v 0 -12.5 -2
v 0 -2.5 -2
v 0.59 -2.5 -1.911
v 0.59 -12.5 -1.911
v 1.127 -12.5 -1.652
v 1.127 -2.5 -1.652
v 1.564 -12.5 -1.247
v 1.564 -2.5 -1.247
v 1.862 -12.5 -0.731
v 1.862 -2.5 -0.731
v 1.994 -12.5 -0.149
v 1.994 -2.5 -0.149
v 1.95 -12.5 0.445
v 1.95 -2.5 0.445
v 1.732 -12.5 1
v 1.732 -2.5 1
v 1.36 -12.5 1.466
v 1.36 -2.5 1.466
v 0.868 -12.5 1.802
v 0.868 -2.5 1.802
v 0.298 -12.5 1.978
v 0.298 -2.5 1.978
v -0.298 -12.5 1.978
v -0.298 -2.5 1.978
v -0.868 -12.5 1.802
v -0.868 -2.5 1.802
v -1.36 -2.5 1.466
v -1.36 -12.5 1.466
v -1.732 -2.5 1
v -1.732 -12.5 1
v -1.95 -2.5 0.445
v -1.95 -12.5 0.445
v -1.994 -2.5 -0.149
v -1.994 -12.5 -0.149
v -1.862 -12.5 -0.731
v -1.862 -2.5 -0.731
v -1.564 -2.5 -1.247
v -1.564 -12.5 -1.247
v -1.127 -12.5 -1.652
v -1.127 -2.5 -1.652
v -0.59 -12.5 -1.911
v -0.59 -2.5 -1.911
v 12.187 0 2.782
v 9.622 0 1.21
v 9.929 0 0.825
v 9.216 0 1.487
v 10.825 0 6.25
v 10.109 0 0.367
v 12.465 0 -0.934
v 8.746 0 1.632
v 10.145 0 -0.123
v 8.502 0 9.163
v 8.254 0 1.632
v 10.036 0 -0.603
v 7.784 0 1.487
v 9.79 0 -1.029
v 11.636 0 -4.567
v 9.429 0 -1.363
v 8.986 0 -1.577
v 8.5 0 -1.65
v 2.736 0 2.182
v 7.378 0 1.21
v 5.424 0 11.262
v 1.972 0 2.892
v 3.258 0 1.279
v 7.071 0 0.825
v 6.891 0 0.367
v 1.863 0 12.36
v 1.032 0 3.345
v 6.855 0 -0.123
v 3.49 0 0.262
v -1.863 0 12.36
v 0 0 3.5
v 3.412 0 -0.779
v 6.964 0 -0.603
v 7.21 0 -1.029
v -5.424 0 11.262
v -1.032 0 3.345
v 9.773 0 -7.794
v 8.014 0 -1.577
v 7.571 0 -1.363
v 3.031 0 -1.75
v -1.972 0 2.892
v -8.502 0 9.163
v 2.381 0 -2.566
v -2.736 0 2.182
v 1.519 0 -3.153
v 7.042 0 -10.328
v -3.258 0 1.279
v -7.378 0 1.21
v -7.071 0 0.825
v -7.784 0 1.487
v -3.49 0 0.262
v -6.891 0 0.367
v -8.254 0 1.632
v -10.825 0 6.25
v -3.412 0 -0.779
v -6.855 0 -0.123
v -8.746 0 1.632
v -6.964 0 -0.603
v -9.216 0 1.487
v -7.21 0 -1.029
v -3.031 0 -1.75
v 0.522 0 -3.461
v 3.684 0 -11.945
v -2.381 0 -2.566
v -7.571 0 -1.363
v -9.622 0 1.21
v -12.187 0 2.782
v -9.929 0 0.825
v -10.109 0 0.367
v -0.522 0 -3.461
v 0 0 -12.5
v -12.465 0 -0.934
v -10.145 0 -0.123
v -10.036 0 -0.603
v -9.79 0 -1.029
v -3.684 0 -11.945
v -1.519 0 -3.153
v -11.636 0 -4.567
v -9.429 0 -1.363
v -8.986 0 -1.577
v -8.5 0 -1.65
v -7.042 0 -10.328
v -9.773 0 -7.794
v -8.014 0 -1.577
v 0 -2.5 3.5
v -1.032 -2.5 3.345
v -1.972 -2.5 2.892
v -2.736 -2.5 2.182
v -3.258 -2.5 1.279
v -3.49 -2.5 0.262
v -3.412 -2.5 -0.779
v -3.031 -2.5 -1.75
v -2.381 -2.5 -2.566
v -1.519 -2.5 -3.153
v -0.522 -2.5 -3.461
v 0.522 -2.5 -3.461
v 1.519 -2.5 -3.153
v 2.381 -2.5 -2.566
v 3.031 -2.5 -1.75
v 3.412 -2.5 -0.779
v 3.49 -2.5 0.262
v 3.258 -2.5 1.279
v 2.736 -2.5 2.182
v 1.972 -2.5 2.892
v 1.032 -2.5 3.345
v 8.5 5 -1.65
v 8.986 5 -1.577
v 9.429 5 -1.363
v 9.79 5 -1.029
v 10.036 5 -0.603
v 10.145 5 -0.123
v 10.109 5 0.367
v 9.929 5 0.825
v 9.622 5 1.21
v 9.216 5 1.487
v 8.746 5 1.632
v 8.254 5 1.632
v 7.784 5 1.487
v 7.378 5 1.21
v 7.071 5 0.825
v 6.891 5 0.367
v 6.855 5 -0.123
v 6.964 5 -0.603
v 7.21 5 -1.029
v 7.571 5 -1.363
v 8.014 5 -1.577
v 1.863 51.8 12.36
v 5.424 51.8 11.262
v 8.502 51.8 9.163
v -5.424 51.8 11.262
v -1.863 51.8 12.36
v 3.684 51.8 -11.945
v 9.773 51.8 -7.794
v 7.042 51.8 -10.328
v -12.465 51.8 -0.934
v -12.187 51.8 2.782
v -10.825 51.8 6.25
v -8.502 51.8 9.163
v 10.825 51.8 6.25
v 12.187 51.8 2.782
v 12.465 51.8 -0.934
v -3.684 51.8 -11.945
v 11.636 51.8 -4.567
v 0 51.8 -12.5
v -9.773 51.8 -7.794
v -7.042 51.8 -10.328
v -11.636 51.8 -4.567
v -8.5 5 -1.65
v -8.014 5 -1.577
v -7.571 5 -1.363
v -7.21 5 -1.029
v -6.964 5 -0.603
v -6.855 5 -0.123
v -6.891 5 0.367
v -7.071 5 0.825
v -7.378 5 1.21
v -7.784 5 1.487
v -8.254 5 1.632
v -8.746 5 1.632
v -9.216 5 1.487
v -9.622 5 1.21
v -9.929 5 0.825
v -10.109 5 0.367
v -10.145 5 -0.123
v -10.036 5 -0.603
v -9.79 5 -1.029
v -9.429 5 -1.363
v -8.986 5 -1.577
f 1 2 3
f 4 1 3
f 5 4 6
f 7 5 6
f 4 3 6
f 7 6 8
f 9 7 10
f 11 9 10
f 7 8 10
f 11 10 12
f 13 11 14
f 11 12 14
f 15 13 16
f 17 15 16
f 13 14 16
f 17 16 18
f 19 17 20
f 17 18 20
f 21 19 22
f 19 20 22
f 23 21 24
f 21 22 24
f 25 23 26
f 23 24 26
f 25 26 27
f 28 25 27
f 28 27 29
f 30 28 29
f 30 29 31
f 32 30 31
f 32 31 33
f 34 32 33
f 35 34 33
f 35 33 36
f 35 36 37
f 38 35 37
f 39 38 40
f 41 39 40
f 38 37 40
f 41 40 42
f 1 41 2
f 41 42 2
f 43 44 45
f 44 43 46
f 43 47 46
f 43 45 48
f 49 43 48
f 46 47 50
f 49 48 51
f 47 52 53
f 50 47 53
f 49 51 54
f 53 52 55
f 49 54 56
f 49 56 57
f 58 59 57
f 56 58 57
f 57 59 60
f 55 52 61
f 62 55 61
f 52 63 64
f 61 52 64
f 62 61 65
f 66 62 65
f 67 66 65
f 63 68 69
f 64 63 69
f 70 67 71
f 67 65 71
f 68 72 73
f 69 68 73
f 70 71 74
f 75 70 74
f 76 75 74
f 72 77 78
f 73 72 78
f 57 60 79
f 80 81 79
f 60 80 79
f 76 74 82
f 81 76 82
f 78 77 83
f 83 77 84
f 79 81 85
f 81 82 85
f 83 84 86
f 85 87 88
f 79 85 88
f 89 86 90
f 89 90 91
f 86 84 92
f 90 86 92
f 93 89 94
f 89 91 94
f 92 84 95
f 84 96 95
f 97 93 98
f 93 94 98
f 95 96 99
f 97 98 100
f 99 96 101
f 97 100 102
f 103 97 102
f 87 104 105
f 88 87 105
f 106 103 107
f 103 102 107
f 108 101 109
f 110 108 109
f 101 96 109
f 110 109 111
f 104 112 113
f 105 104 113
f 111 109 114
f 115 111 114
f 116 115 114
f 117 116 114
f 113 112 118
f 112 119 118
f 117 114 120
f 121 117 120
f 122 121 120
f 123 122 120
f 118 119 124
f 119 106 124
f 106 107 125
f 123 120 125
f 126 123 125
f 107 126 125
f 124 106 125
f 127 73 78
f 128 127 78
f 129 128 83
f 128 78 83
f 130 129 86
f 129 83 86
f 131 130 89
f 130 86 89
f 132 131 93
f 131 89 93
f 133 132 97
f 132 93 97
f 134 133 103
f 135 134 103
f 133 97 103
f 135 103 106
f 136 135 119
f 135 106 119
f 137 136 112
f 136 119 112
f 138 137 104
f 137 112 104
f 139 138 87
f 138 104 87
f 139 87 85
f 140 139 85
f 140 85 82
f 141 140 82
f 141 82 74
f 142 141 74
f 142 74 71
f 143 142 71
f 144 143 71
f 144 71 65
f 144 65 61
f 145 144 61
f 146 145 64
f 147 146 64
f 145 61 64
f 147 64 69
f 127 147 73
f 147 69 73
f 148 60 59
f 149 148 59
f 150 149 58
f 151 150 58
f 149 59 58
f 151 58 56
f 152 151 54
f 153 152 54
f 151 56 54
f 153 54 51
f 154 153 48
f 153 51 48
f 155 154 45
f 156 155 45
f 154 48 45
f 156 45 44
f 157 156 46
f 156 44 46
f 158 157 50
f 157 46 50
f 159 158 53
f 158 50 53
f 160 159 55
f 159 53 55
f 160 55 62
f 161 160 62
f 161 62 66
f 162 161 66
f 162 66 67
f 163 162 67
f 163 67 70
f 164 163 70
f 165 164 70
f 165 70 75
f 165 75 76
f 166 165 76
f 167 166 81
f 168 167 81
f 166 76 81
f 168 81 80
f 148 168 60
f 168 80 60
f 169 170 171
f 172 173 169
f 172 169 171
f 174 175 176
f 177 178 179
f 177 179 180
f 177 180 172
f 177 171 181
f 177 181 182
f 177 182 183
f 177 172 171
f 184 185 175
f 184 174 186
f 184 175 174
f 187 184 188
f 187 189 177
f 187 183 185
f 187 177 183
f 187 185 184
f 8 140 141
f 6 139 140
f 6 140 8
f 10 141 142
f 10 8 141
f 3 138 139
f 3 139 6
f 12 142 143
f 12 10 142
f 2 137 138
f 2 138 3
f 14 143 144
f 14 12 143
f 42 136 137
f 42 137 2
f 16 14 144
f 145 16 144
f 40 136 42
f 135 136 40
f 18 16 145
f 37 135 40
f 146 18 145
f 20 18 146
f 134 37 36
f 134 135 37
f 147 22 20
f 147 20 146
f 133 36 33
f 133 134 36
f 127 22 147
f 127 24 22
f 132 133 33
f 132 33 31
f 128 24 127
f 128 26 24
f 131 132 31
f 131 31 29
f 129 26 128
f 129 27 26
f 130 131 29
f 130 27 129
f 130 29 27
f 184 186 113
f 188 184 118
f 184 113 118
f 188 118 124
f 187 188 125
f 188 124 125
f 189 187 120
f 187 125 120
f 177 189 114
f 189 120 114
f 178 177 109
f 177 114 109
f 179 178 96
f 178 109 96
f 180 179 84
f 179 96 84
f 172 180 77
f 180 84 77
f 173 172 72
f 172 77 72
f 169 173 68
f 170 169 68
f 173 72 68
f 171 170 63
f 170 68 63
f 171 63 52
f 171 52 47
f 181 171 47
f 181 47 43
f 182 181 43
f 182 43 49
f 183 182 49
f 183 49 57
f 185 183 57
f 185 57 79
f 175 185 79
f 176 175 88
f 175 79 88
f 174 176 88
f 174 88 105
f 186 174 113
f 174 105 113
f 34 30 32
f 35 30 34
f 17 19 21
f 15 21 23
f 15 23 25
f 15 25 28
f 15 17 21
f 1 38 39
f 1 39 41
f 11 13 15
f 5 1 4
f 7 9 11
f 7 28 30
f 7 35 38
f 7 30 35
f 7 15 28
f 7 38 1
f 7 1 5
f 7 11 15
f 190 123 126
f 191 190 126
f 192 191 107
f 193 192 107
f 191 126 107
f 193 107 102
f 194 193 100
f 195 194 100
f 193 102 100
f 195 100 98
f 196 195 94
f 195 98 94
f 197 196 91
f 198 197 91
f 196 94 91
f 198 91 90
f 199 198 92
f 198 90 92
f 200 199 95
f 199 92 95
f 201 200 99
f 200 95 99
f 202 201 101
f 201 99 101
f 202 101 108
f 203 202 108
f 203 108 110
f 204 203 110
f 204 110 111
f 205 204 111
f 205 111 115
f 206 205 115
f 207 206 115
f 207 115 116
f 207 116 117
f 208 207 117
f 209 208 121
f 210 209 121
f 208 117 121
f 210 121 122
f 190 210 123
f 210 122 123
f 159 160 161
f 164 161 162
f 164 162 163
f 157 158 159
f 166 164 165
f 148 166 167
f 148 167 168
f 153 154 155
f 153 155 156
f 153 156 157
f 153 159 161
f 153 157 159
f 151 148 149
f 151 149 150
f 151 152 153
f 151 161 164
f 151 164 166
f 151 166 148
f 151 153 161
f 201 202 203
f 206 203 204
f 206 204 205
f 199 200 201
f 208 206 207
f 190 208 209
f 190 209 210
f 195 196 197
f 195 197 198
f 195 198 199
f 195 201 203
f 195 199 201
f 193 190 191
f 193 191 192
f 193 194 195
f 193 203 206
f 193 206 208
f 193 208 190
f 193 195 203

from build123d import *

# Parameters (mm, degrees)
SKETCH1_R           = 12.5
BOSS_EXTRUDE1_DEPTH = 51.8
SKETCH2_R           = 3.5
BOSS_EXTRUDE2_DEPTH = 2.5
SKETCH3_R           = 2
BOSS_EXTRUDE3_DEPTH = 10
SKETCH4_R           = 1.65
CUT_EXTRUDE1_DEPTH  = 5


with BuildPart() as part:
    # Sketch1 → Boss-Extrude1 (new body)
    with BuildSketch(Plane(origin=(0, 0, 0), x_dir=(1, 0, 0), z_dir=(0, 1, 0))):
        with Locations(Location((0, 0, 0), (0, 0, 90))):
            Circle(SKETCH1_R)
    extrude(amount=BOSS_EXTRUDE1_DEPTH)

    # Sketch2 → Boss-Extrude2 (add)
    with BuildSketch(Plane(origin=(0, 0, 0), x_dir=(-1, 0, 0), z_dir=(0, -1, 0))):
        with Locations(Location((0, 0, 0), (0, 0, 270))):
            Circle(SKETCH2_R)
    extrude(amount=BOSS_EXTRUDE2_DEPTH)

    # Sketch3 → Boss-Extrude3 (add)
    with BuildSketch(Plane(origin=(0, -2.5, 0), x_dir=(-1, 0, 0), z_dir=(0, -1, 0))):
        with Locations(Location((0, 0, 0), (0, 0, 90))):
            Circle(SKETCH3_R)
    extrude(amount=BOSS_EXTRUDE3_DEPTH)

    # Sketch4 → Cut-Extrude1 (cut)
    with BuildSketch(Plane(origin=(0, 0, 0), x_dir=(-1, 0, 0), z_dir=(0, -1, 0))):
        with Locations(Location((8.5, 0, 0), (0, 0, 90))):
            Circle(SKETCH4_R)
        with Locations(Location((-8.5, 0, 0), (0, 0, 90))):
            Circle(SKETCH4_R)
    extrude(amount=-CUT_EXTRUDE1_DEPTH, mode=Mode.SUBTRACT)


solid = part.part
